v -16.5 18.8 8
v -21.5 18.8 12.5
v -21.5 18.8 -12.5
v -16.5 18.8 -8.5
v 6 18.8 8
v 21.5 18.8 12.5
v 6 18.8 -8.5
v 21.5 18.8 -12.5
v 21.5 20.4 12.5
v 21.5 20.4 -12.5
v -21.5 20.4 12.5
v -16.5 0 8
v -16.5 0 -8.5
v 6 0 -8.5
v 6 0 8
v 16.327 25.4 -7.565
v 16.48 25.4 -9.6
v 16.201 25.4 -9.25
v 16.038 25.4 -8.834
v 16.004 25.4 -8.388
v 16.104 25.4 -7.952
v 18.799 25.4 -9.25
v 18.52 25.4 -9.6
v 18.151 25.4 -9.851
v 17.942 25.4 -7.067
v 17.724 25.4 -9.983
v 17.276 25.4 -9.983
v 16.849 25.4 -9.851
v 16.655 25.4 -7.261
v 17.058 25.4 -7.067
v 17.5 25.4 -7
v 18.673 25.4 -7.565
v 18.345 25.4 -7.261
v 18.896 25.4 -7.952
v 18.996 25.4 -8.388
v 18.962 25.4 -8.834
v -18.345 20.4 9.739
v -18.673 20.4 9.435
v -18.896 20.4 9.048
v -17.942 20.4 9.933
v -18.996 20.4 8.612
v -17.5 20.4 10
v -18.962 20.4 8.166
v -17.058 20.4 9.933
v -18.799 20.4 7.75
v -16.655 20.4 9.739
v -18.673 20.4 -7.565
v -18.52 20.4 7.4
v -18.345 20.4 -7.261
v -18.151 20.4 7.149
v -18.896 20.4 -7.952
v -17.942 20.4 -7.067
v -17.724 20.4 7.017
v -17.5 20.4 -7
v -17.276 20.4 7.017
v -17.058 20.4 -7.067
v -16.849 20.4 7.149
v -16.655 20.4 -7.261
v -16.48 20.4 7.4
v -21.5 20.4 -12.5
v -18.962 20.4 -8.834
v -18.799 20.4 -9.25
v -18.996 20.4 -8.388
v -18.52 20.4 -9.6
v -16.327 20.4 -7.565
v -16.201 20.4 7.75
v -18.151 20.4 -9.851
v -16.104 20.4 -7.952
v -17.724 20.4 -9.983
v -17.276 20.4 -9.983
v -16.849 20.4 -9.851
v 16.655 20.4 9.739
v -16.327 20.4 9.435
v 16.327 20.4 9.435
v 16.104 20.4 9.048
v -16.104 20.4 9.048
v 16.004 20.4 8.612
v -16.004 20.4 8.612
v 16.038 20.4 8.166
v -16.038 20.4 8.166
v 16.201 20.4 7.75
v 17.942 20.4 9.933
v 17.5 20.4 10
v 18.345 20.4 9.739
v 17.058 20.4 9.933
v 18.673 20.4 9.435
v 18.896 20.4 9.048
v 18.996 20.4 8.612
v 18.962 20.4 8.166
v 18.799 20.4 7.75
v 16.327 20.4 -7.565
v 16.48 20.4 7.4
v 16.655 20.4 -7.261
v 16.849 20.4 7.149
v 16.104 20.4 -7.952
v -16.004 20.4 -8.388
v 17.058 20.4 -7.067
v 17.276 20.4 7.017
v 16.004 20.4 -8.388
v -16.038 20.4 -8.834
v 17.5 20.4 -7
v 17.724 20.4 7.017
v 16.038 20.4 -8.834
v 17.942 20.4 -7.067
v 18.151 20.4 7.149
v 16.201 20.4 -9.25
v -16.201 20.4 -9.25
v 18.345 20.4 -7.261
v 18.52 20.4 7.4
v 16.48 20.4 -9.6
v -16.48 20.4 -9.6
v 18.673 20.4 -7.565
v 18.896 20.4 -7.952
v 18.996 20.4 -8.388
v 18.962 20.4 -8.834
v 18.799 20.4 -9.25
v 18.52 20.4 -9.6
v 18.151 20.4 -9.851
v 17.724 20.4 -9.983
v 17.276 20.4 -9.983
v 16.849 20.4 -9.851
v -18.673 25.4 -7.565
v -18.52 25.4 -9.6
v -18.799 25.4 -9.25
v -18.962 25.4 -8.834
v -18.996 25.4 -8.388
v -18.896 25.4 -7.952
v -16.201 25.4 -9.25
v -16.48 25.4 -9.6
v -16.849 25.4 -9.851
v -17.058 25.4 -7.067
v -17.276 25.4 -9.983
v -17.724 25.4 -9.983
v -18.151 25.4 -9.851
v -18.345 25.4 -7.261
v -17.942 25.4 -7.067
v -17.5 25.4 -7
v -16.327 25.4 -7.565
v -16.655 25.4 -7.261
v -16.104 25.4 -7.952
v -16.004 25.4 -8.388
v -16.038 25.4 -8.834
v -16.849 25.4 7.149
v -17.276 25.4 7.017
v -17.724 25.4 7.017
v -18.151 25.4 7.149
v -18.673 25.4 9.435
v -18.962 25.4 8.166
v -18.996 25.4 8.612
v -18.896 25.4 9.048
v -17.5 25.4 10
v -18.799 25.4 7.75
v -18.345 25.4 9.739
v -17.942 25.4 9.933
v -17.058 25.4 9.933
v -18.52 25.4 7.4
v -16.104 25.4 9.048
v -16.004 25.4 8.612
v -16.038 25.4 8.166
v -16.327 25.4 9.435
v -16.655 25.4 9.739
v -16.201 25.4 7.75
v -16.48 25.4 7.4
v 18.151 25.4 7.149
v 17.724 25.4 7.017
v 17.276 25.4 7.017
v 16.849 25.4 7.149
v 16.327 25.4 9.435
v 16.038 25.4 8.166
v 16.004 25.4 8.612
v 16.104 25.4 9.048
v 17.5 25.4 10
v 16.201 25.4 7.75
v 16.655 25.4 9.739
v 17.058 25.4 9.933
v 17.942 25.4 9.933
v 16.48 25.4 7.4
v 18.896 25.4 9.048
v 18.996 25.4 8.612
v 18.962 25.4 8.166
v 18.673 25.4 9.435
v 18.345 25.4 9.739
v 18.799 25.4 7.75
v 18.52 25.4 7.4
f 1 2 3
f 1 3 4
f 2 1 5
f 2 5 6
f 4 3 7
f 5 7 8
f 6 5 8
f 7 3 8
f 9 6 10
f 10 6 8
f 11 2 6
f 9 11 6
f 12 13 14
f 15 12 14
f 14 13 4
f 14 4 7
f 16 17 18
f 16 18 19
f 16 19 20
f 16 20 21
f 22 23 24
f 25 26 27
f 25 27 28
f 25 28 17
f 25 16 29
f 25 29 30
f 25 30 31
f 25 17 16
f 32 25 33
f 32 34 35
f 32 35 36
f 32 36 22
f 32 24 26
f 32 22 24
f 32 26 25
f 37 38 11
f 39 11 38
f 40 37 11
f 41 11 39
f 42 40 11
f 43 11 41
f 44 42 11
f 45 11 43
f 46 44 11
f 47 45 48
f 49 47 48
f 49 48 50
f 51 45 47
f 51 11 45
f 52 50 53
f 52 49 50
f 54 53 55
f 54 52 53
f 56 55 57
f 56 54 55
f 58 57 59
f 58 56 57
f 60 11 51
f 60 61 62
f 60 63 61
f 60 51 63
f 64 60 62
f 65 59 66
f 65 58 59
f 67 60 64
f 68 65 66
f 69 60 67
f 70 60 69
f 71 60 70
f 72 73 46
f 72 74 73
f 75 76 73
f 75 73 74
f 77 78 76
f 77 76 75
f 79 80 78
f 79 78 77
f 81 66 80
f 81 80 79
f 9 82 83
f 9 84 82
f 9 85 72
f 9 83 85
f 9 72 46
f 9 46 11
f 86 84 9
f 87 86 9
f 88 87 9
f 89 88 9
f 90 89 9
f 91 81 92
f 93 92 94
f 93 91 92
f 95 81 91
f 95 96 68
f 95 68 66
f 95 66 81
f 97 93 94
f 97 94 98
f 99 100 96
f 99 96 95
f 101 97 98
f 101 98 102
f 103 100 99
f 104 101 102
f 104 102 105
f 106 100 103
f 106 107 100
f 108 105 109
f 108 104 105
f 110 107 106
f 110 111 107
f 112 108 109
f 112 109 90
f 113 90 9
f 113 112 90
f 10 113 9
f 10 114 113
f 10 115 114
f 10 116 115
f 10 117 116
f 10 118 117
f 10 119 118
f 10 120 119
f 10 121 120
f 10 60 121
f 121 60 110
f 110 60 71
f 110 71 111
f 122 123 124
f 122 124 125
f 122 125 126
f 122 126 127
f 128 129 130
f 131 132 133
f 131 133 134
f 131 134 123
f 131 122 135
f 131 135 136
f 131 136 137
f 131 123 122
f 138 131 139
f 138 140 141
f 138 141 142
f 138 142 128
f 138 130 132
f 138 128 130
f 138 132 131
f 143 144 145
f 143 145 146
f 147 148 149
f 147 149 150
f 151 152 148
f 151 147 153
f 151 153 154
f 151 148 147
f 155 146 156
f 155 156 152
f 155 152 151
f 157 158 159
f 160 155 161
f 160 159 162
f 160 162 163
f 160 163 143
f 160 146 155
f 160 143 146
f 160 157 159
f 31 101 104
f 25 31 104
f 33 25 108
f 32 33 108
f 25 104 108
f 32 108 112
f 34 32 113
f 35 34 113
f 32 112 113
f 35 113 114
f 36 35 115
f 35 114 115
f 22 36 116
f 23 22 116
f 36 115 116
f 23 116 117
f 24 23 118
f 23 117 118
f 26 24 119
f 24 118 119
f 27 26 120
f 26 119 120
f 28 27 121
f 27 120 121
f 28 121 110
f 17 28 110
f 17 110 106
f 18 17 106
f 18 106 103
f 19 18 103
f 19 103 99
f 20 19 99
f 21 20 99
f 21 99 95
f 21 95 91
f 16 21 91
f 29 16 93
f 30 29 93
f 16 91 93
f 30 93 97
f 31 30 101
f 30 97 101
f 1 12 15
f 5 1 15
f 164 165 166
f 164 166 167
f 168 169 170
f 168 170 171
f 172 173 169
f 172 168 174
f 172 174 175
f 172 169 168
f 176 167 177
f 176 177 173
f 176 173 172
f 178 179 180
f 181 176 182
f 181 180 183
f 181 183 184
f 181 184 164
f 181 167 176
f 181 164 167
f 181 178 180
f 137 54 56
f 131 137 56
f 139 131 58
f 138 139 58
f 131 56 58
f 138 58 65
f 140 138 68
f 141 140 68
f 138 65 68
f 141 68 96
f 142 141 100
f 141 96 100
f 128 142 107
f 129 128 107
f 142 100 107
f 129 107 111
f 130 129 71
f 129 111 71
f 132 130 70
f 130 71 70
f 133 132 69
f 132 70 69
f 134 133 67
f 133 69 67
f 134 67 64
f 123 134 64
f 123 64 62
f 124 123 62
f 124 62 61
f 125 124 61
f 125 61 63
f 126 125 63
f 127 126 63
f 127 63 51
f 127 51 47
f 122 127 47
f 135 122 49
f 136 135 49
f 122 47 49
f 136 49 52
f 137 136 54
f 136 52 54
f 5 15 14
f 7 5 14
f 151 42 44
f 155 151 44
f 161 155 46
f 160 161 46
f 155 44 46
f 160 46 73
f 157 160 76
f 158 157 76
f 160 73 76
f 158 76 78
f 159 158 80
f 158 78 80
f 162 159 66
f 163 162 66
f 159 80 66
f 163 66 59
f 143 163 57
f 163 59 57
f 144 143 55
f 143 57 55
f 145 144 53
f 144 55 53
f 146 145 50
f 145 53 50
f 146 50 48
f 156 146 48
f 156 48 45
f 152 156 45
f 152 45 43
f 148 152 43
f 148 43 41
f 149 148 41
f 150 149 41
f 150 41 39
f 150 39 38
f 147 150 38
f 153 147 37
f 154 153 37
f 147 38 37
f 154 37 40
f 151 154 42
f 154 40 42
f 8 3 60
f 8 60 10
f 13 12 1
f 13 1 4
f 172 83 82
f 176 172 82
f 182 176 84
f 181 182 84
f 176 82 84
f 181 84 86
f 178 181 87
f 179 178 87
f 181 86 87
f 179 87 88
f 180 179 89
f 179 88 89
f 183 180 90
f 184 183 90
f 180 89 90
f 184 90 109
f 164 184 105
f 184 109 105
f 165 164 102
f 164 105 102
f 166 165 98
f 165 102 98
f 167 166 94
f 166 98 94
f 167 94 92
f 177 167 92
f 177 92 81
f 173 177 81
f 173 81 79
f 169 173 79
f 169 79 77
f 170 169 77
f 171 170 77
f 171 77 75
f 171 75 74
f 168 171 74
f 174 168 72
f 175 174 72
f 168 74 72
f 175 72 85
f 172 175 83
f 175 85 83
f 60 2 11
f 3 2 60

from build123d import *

# Parameters (mm, degrees)
P01_STANDOFF_START                = 20.4
SK_P01_STANDOFF_R                 = 1.5
P01_STANDOFF_DEPTH                = 5
P02_STANDOFF_START                = 20.4
SK_P02_STANDOFF_R                 = 1.5
P02_STANDOFF_DEPTH                = 5
P03_STANDOFF_START                = 20.4
SK_P03_STANDOFF_R                 = 1.5
P03_STANDOFF_DEPTH                = 5
P04_STANDOFF_START                = 20.4
SK_P04_STANDOFF_R                 = 1.5
P04_STANDOFF_DEPTH                = 5
P05_POLOLURCSWITCHWITHRELAY_START = 18.8
SK_P05_POLOLURCSWITCHWITHRELAY_W  = 43
SK_P05_POLOLURCSWITCHWITHRELAY_H  = 25
P05_POLOLURCSWITCHWITHRELAY_DEPTH = 1.6
SK_P06_RELAYG5LE_W                = 22.5
SK_P06_RELAYG5LE_H                = 16.5
P06_RELAYG5LE_DEPTH               = 18.8


with BuildPart() as part:
    # SK_P01_Standoff → P01_Standoff (new body)
    with BuildSketch(Plane(origin=(0, 0, 0), x_dir=(1, 0, 0), z_dir=(0, 1, 0)).offset(P01_STANDOFF_START)):
        with Locations(Location((-17.5, 8.5, 0), (0, 0, 270))):
            Circle(SK_P01_STANDOFF_R)
    extrude(amount=P01_STANDOFF_DEPTH)



with BuildPart() as body_2:
    # SK_P02_Standoff → P02_Standoff (new body)
    with BuildSketch(Plane(origin=(0, 0, 0), x_dir=(1, 0, 0), z_dir=(0, 1, 0)).offset(P02_STANDOFF_START)):
        with Locations(Location((-17.5, -8.5, 0), (0, 0, 270))):
            Circle(SK_P02_STANDOFF_R)
    extrude(amount=P02_STANDOFF_DEPTH)


with BuildPart() as body_3:
    # SK_P03_Standoff → P03_Standoff (new body)
    with BuildSketch(Plane(origin=(0, 0, 0), x_dir=(1, 0, 0), z_dir=(0, 1, 0)).offset(P03_STANDOFF_START)):
        with Locations(Location((17.5, 8.5, 0), (0, 0, 270))):
            Circle(SK_P03_STANDOFF_R)
    extrude(amount=P03_STANDOFF_DEPTH)


with BuildPart() as body_4:
    # SK_P04_Standoff → P04_Standoff (new body)
    with BuildSketch(Plane(origin=(0, 0, 0), x_dir=(1, 0, 0), z_dir=(0, 1, 0)).offset(P04_STANDOFF_START)):
        with Locations(Location((17.5, -8.5, 0), (0, 0, 270))):
            Circle(SK_P04_STANDOFF_R)
    extrude(amount=P04_STANDOFF_DEPTH)


with BuildPart() as part_1:
    add(part.part)

    add(body_2.part)  # P05_PololuRCswitchwithrelay merges body 2

    add(body_3.part)  # P05_PololuRCswitchwithrelay merges body 3

    add(body_4.part)  # P05_PololuRCswitchwithrelay merges body 4
    # SK_P05_PololuRCswitchwithrelay → P05_PololuRCswitchwithrelay (add)
    with BuildSketch(Plane(origin=(0, 0, 0), x_dir=(1, 0, 0), z_dir=(0, 1, 0)).offset(P05_POLOLURCSWITCHWITHRELAY_START)):
        Rectangle(SK_P05_POLOLURCSWITCHWITHRELAY_W, SK_P05_POLOLURCSWITCHWITHRELAY_H)
    extrude(amount=P05_POLOLURCSWITCHWITHRELAY_DEPTH)

    # SK_P06_RelayG5LE → P06_RelayG5LE (add)
    with BuildSketch(Plane(origin=(0, 0, 0), x_dir=(1, 0, 0), z_dir=(0, 1, 0))):
        with Locations((-5.25, 0.25)):
            Rectangle(SK_P06_RELAYG5LE_W, SK_P06_RELAYG5LE_H)
    extrude(amount=P06_RELAYG5LE_DEPTH)


solid = part_1.part
